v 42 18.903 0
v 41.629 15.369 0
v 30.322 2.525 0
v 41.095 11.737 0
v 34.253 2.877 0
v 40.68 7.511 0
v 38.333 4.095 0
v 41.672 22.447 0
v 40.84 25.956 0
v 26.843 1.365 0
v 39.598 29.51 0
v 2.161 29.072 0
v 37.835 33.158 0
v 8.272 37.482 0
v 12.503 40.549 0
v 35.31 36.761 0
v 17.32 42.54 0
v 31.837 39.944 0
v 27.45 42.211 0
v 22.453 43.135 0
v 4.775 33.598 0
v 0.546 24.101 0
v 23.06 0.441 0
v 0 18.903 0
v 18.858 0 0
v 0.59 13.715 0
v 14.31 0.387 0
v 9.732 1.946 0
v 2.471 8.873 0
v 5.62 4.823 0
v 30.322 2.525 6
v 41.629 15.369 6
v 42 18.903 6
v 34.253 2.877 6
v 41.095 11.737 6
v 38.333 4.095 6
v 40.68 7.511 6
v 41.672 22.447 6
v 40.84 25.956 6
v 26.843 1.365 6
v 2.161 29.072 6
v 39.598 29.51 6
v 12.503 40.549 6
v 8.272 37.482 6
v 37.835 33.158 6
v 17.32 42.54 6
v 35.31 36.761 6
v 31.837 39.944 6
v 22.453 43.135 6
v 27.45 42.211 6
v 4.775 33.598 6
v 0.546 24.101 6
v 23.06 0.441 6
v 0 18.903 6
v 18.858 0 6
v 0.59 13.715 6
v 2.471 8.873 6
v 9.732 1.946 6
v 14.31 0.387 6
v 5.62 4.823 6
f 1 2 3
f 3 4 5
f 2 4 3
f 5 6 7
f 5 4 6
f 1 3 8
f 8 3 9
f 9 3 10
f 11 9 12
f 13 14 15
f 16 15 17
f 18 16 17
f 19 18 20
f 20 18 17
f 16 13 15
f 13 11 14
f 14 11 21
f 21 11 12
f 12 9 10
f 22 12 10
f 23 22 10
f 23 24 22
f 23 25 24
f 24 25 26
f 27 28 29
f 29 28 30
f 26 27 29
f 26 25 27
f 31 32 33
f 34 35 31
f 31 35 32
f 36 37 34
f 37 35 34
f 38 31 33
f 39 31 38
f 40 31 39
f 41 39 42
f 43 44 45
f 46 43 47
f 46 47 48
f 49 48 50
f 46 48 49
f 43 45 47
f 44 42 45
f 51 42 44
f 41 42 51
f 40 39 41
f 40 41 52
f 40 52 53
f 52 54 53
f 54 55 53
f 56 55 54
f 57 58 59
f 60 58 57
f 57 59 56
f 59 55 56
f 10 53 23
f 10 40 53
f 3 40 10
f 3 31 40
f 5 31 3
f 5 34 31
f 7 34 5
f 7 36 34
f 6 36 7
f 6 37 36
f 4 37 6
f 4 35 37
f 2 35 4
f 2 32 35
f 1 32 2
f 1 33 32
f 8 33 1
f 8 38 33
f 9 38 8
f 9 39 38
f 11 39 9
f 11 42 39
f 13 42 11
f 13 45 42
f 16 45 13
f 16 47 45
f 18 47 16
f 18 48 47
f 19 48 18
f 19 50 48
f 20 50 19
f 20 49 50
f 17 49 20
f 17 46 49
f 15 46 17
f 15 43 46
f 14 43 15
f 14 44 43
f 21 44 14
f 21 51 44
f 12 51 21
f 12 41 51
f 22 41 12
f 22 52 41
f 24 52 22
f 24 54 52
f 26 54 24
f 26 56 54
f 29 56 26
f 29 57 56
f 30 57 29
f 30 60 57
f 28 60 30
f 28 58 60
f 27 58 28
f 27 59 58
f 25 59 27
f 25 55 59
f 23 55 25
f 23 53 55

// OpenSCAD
$fn = 32;

// ----------------------------------------------------------------------
// Cam disc: base radius 17.0 mm, lift 8.0 mm, 30 profile points
// ----------------------------------------------------------------------

// --- parameters (mm) ---
profile_height = 6;       // extrusion height
profile_points = 30;      // points of the closed outline

profile = [[42, 18.903], [41.672, 22.447], [40.84, 25.956], [39.598, 29.51], [37.835, 33.158], [35.31, 36.761], [31.837, 39.944], [27.45, 42.211], [22.453, 43.135], [17.32, 42.54], [12.503, 40.549], [8.272, 37.482], [4.775, 33.598], [2.161, 29.072], [0.546, 24.101], [0, 18.903], [0.59, 13.715], [2.471, 8.873], [5.62, 4.823], [9.732, 1.946], [14.31, 0.387], [18.858, 0], [23.06, 0.441], [26.843, 1.365], [30.322, 2.525], [34.253, 2.877], [38.333, 4.095], [40.68, 7.511], [41.095, 11.737], [41.629, 15.369]];  // single closed polygon, 30 points, counter clockwise

// --- the one profile operation ---
linear_extrude(height = profile_height) polygon(points = profile);
